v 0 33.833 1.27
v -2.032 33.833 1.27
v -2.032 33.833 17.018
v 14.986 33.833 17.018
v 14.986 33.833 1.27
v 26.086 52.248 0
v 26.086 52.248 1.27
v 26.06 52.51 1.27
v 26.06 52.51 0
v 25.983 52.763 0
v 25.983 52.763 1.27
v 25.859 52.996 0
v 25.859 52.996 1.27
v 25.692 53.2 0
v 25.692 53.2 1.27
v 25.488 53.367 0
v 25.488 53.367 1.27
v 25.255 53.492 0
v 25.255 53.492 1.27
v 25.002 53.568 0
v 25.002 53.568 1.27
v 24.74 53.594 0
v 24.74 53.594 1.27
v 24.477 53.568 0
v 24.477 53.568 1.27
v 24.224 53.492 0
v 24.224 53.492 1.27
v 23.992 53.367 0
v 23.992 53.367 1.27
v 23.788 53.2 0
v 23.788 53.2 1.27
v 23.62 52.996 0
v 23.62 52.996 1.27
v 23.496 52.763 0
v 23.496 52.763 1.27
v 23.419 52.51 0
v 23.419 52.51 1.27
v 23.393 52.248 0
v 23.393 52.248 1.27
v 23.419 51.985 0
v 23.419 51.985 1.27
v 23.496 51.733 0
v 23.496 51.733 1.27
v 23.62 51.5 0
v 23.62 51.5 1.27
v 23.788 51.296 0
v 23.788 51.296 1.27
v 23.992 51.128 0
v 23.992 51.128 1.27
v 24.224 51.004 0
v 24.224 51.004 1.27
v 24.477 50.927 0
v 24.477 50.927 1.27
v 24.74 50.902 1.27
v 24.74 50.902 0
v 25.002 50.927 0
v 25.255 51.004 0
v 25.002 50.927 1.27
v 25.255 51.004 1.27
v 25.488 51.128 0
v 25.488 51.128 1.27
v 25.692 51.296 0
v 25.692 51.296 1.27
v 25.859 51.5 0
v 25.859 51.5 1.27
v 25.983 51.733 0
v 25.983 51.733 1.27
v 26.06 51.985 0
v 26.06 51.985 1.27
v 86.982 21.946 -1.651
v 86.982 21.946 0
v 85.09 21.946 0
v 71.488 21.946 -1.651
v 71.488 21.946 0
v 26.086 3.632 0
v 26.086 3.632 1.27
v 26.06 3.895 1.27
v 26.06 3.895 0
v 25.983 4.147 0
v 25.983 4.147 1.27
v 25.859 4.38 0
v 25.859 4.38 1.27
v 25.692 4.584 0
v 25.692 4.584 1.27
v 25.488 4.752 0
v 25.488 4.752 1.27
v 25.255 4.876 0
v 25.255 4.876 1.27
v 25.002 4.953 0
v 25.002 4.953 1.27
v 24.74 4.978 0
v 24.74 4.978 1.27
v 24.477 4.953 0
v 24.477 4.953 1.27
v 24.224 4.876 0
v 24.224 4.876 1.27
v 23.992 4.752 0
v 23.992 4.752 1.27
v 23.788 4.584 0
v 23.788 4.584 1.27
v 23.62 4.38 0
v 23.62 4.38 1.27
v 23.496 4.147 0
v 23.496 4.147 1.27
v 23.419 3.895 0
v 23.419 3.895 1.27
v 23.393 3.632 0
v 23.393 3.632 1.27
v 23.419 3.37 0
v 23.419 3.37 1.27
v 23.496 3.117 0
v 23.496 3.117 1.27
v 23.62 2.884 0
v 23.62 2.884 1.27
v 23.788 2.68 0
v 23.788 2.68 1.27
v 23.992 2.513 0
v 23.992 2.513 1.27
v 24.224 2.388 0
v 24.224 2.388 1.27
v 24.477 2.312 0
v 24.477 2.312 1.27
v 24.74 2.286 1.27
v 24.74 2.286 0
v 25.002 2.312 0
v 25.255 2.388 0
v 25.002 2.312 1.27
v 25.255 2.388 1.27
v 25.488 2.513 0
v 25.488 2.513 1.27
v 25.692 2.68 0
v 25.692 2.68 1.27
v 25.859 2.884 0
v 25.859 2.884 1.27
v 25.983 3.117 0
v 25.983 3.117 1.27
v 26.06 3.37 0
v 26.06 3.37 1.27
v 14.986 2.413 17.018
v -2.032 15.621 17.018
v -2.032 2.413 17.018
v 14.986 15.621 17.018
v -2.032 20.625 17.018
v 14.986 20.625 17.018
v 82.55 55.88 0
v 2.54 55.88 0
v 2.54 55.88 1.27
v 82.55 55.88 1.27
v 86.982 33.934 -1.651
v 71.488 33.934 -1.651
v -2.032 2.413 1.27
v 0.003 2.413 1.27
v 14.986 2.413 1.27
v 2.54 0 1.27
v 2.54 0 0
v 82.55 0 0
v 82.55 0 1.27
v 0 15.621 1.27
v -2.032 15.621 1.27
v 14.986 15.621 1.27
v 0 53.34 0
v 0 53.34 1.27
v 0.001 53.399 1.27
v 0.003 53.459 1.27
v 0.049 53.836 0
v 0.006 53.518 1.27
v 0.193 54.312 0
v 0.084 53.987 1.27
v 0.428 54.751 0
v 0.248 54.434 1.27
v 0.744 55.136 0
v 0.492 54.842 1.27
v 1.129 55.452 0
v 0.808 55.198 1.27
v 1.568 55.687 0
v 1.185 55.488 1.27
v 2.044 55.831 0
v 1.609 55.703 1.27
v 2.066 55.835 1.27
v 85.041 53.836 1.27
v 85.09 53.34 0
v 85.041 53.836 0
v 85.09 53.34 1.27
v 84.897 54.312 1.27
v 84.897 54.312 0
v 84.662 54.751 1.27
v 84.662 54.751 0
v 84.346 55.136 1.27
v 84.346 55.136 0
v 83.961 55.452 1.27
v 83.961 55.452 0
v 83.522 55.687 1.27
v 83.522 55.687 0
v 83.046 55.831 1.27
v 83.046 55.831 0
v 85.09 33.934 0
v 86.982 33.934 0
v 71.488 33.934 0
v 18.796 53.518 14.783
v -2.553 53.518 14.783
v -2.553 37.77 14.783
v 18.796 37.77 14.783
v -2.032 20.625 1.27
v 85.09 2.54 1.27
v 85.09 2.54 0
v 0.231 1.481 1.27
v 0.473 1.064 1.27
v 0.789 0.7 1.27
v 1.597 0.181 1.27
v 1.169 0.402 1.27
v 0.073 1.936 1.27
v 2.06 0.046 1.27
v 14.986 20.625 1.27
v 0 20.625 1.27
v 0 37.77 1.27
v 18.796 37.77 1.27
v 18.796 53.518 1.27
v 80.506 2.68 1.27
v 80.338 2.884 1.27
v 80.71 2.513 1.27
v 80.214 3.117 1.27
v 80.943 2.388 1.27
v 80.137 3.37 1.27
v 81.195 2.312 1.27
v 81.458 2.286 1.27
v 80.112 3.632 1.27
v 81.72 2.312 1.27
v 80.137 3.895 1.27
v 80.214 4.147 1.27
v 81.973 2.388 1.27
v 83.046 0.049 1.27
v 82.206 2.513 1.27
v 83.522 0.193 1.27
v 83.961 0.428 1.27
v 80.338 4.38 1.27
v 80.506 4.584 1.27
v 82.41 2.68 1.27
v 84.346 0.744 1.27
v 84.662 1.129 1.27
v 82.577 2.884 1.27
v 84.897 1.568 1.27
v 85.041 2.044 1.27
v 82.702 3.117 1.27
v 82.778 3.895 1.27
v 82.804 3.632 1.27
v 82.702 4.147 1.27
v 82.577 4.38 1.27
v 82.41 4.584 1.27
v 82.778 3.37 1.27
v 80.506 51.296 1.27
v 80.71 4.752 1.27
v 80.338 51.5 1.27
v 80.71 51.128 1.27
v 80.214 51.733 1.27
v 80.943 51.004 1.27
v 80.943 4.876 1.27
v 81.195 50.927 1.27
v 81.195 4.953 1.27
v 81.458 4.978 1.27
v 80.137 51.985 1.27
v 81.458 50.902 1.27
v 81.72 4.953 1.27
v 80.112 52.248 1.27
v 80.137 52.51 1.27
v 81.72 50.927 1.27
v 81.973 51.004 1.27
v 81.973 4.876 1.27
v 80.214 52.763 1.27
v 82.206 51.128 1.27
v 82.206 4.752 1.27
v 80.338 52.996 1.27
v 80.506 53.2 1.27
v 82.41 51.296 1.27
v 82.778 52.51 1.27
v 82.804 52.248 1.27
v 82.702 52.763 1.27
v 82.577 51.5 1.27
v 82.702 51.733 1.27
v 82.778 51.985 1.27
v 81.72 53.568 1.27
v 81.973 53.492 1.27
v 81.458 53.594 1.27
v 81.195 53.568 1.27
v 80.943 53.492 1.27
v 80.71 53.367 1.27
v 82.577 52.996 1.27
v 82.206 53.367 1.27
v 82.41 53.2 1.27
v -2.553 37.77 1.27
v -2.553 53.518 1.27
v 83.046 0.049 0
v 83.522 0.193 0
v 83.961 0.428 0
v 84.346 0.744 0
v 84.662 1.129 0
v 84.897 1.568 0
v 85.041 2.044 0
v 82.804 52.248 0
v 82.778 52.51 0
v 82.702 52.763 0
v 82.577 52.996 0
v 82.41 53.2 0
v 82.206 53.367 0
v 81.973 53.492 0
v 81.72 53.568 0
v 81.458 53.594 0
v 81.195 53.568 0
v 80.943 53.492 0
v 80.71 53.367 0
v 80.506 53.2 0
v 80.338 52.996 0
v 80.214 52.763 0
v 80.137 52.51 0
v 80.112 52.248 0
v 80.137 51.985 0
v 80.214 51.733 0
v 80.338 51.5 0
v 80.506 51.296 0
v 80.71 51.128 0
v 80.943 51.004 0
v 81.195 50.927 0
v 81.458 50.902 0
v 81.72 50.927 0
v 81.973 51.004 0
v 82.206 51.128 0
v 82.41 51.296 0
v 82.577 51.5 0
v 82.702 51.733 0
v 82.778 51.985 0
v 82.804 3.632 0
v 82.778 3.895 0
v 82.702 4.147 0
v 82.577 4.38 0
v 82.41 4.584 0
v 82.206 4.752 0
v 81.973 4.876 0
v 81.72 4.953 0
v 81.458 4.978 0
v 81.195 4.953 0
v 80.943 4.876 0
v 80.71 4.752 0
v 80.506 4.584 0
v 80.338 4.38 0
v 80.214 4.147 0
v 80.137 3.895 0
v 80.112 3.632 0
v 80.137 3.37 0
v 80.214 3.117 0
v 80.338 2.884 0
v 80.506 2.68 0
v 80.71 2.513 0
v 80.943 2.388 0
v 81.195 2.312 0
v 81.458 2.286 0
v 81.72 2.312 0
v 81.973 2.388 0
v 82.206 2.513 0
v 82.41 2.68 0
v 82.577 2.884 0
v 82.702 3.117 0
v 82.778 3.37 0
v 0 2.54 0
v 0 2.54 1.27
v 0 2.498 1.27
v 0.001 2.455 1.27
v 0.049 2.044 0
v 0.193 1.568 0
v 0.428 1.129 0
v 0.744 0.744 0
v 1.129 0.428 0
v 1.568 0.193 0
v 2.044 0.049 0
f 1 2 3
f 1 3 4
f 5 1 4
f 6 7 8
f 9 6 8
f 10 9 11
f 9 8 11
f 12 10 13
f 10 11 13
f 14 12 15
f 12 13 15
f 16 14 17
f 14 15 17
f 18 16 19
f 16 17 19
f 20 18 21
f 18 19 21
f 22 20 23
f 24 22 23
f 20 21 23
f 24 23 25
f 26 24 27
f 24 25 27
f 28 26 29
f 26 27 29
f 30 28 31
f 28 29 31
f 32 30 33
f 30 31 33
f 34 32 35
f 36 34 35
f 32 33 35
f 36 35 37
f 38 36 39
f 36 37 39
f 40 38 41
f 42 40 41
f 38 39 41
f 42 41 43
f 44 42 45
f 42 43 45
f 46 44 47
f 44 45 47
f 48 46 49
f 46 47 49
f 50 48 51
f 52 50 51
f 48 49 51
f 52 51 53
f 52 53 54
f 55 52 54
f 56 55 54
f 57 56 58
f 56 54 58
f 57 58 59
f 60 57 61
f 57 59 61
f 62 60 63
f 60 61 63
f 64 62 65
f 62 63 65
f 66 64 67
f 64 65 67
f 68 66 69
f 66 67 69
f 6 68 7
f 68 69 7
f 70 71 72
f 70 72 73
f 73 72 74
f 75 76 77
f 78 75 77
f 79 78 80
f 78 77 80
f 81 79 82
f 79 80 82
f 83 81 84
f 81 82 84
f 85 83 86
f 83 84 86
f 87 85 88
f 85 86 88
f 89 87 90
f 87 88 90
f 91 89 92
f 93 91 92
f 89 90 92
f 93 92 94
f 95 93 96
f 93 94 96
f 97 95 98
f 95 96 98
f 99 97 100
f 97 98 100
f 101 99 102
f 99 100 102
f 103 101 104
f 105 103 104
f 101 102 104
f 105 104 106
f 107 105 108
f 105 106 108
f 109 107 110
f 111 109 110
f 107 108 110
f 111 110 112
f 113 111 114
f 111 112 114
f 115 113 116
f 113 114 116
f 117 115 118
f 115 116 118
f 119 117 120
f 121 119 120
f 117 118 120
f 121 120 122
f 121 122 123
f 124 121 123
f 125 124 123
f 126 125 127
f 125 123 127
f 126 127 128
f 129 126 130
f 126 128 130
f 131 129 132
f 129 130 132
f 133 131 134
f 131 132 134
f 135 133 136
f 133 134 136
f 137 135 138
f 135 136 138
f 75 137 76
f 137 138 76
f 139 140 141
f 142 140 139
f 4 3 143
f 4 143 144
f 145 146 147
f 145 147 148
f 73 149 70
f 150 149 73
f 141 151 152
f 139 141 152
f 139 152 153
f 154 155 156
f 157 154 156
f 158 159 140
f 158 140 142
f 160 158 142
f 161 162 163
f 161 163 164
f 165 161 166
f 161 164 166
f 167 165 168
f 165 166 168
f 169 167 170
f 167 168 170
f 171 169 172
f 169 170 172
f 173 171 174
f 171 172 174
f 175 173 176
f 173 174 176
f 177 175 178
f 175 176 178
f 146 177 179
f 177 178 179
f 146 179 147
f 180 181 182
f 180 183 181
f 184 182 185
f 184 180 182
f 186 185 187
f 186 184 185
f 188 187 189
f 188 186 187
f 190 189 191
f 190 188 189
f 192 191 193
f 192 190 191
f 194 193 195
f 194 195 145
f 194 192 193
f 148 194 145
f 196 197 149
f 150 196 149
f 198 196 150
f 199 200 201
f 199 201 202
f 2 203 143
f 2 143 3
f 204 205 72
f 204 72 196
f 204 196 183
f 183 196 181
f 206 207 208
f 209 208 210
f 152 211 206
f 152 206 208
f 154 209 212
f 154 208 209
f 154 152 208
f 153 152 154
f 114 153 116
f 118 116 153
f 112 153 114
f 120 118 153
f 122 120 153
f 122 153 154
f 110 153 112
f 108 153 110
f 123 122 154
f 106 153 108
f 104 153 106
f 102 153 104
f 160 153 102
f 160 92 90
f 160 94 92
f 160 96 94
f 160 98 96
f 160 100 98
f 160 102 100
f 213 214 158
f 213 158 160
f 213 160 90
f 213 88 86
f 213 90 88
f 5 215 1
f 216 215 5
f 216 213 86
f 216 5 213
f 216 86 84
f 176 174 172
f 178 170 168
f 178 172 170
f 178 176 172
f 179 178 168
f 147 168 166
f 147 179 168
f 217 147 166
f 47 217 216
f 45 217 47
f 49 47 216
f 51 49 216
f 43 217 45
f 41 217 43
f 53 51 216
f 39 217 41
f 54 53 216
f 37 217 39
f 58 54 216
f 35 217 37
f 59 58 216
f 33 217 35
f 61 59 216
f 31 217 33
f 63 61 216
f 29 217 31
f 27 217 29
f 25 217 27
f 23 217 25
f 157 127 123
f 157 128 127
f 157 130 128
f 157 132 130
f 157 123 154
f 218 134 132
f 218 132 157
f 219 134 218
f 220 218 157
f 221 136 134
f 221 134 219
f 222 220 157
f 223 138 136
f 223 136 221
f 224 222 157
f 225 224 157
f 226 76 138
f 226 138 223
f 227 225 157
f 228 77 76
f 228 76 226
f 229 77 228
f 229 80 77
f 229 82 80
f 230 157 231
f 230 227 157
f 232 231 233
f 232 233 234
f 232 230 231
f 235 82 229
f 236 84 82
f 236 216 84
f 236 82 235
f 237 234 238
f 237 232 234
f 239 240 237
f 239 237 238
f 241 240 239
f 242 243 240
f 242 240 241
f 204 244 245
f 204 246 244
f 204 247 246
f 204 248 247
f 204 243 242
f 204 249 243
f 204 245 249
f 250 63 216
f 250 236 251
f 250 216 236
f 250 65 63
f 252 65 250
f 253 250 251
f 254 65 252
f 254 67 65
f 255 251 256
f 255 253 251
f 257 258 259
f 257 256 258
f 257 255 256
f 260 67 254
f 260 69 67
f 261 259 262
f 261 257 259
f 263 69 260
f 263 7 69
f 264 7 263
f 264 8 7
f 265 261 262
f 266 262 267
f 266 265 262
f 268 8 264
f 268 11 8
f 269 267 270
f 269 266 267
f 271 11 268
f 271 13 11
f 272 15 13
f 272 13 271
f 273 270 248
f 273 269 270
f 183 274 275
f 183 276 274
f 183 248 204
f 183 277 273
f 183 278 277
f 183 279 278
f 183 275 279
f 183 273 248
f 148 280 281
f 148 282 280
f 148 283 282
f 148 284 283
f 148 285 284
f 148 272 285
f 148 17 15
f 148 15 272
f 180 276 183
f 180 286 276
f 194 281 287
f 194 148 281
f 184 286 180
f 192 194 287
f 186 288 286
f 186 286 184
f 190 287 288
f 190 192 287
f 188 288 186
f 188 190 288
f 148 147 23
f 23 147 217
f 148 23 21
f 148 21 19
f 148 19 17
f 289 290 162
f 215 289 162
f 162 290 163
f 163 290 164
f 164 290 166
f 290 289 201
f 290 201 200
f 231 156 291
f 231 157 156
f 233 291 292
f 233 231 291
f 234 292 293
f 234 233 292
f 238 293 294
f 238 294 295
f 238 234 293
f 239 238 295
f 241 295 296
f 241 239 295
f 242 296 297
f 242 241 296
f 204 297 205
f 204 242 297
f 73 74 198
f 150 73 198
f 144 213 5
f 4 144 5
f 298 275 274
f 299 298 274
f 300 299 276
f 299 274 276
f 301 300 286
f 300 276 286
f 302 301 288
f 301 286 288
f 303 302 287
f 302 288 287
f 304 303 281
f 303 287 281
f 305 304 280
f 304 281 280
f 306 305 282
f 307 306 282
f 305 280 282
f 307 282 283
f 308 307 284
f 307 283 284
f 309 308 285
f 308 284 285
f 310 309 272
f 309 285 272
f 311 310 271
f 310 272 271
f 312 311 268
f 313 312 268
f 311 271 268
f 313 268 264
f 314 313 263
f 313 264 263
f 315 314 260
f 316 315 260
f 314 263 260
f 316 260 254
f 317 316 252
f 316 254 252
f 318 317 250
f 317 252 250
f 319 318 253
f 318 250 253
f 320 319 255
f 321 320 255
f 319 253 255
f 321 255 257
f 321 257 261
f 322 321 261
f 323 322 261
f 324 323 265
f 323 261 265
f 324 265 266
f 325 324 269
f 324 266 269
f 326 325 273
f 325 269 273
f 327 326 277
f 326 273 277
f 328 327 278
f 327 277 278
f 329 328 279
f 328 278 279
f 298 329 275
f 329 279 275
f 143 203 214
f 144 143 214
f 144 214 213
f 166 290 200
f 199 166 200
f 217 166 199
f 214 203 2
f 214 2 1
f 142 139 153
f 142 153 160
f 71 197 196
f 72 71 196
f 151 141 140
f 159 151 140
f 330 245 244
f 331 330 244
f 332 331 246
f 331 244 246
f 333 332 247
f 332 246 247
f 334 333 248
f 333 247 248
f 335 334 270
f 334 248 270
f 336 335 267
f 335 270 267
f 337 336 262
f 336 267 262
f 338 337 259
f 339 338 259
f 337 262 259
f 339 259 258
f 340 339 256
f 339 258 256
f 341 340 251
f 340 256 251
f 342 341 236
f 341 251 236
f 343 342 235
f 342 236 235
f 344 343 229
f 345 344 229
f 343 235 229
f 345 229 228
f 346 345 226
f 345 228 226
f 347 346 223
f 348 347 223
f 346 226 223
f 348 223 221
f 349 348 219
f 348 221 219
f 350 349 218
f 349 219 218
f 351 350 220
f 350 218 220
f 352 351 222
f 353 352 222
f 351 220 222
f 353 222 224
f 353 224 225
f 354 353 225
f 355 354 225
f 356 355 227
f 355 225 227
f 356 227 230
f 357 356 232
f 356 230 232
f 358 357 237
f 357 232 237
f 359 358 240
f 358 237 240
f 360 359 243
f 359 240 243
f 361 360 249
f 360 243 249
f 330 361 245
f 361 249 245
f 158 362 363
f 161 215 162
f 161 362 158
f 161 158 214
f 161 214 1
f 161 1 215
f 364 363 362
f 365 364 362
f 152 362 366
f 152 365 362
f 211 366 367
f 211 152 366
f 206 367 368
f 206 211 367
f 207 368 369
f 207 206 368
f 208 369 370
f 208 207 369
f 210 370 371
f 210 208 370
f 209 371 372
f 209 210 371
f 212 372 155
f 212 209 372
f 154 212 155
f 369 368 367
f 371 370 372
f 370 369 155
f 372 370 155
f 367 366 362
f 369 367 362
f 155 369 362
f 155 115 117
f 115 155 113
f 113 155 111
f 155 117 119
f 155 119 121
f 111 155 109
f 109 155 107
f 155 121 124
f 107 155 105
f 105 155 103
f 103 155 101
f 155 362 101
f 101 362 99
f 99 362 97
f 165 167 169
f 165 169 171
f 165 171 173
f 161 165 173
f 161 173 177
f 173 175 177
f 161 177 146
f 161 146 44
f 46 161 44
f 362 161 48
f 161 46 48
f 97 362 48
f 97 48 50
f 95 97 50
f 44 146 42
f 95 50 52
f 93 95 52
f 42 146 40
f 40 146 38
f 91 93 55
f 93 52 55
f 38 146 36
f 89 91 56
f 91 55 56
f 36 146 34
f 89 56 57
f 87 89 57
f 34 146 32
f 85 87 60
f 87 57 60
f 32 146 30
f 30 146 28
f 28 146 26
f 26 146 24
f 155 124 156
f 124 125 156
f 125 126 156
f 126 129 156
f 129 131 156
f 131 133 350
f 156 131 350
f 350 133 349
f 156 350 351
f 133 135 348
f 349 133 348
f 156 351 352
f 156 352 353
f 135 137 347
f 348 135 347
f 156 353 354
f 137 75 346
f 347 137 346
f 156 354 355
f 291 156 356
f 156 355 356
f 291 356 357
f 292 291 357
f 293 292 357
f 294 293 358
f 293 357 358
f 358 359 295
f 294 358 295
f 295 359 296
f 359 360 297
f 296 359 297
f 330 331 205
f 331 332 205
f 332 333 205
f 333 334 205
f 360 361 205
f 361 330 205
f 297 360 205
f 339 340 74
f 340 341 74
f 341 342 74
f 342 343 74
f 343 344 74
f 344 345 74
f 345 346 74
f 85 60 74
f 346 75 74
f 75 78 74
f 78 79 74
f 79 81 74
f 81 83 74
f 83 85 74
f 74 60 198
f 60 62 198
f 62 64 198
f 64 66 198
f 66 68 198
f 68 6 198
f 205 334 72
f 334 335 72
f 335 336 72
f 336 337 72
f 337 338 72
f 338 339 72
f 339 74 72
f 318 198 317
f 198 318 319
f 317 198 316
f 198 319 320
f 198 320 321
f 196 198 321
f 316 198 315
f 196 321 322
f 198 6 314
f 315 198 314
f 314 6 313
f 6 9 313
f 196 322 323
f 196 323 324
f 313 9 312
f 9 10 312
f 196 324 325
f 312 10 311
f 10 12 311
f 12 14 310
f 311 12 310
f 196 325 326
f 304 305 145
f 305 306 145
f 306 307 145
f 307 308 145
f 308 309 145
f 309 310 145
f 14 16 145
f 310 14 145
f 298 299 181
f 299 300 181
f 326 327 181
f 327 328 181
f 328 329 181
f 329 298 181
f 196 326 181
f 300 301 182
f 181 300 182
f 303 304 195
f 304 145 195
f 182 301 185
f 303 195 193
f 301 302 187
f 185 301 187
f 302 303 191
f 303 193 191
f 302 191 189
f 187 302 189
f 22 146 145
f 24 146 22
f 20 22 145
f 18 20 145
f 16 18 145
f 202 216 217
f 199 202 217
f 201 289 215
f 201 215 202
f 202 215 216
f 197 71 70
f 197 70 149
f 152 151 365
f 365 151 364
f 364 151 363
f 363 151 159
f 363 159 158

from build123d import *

# Parameters (mm, degrees)
SKETCH1_W           = 85.09
SKETCH1_H           = 55.88
BOSS_EXTRUDE1_DEPTH = 1.27
FILLET2_R           = 2.54
SKETCH2_R           = 1.3462
CUT_EXTRUDE1_DEPTH  = 1.27
SKETCH3_W           = 17.018
SKETCH3_H           = 13.208
BOSS_EXTRUDE2_DEPTH = 15.748
SKETCH4_W           = 21.3487
SKETCH4_H           = 15.748
BOSS_EXTRUDE3_DEPTH = 13.5128
SKETCH5_W           = 15.494
SKETCH5_H           = 11.9888
BOSS_EXTRUDE4_DEPTH = 1.651


with BuildPart() as part:
    # Sketch1 → Boss-Extrude1 (new body)
    with BuildSketch(Plane.XY):
        with Locations((42.545, 27.94)):
            Rectangle(SKETCH1_W, SKETCH1_H)
    extrude(amount=BOSS_EXTRUDE1_DEPTH)

    # Fillet2
    fillet2_edges = [part.edges().sort_by_distance(p)[0] for p in [
        (85.09, 0, 0.635),
        (0, 0, 0.635),
        (0, 55.88, 0.635),
        (85.09, 55.88, 0.635),
    ]]
    fillet(fillet2_edges, radius=FILLET2_R)

    # Sketch2 → Cut-Extrude1 (cut)
    with BuildSketch(Plane.XY.offset(1.27)):
        with Locations((81.4578, 52.2478)):
            Circle(SKETCH2_R)
        with Locations((24.7396, 52.2478)):
            Circle(SKETCH2_R)
        with Locations((24.7396, 3.6322)):
            Circle(SKETCH2_R)
        with Locations((81.4578, 3.6322)):
            Circle(SKETCH2_R)
    extrude(amount=-CUT_EXTRUDE1_DEPTH, mode=Mode.SUBTRACT)

    # Sketch3 → Boss-Extrude2 (add)
    with BuildSketch(Plane.XY.offset(1.27)):
        with Locations((6.477, 27.2288)):
            Rectangle(SKETCH3_W, SKETCH3_H)
        with Locations((6.477, 9.017)):
            Rectangle(SKETCH3_W, SKETCH3_H)
    extrude(amount=BOSS_EXTRUDE2_DEPTH)

    # Sketch4 → Boss-Extrude3 (add)
    with BuildSketch(Plane.XY.offset(1.27)):
        with Locations((8.12165, 45.6438)):
            Rectangle(SKETCH4_W, SKETCH4_H)
    extrude(amount=BOSS_EXTRUDE3_DEPTH)

    # Sketch5 → Boss-Extrude4 (add)
    with BuildSketch(Plane(origin=(0, 0, 0), x_dir=(-1, 0, 0), z_dir=(0, 0, -1))):
        with Locations((-79.2353, 27.94)):
            Rectangle(SKETCH5_W, SKETCH5_H)
    extrude(amount=BOSS_EXTRUDE4_DEPTH)


solid = part.part
